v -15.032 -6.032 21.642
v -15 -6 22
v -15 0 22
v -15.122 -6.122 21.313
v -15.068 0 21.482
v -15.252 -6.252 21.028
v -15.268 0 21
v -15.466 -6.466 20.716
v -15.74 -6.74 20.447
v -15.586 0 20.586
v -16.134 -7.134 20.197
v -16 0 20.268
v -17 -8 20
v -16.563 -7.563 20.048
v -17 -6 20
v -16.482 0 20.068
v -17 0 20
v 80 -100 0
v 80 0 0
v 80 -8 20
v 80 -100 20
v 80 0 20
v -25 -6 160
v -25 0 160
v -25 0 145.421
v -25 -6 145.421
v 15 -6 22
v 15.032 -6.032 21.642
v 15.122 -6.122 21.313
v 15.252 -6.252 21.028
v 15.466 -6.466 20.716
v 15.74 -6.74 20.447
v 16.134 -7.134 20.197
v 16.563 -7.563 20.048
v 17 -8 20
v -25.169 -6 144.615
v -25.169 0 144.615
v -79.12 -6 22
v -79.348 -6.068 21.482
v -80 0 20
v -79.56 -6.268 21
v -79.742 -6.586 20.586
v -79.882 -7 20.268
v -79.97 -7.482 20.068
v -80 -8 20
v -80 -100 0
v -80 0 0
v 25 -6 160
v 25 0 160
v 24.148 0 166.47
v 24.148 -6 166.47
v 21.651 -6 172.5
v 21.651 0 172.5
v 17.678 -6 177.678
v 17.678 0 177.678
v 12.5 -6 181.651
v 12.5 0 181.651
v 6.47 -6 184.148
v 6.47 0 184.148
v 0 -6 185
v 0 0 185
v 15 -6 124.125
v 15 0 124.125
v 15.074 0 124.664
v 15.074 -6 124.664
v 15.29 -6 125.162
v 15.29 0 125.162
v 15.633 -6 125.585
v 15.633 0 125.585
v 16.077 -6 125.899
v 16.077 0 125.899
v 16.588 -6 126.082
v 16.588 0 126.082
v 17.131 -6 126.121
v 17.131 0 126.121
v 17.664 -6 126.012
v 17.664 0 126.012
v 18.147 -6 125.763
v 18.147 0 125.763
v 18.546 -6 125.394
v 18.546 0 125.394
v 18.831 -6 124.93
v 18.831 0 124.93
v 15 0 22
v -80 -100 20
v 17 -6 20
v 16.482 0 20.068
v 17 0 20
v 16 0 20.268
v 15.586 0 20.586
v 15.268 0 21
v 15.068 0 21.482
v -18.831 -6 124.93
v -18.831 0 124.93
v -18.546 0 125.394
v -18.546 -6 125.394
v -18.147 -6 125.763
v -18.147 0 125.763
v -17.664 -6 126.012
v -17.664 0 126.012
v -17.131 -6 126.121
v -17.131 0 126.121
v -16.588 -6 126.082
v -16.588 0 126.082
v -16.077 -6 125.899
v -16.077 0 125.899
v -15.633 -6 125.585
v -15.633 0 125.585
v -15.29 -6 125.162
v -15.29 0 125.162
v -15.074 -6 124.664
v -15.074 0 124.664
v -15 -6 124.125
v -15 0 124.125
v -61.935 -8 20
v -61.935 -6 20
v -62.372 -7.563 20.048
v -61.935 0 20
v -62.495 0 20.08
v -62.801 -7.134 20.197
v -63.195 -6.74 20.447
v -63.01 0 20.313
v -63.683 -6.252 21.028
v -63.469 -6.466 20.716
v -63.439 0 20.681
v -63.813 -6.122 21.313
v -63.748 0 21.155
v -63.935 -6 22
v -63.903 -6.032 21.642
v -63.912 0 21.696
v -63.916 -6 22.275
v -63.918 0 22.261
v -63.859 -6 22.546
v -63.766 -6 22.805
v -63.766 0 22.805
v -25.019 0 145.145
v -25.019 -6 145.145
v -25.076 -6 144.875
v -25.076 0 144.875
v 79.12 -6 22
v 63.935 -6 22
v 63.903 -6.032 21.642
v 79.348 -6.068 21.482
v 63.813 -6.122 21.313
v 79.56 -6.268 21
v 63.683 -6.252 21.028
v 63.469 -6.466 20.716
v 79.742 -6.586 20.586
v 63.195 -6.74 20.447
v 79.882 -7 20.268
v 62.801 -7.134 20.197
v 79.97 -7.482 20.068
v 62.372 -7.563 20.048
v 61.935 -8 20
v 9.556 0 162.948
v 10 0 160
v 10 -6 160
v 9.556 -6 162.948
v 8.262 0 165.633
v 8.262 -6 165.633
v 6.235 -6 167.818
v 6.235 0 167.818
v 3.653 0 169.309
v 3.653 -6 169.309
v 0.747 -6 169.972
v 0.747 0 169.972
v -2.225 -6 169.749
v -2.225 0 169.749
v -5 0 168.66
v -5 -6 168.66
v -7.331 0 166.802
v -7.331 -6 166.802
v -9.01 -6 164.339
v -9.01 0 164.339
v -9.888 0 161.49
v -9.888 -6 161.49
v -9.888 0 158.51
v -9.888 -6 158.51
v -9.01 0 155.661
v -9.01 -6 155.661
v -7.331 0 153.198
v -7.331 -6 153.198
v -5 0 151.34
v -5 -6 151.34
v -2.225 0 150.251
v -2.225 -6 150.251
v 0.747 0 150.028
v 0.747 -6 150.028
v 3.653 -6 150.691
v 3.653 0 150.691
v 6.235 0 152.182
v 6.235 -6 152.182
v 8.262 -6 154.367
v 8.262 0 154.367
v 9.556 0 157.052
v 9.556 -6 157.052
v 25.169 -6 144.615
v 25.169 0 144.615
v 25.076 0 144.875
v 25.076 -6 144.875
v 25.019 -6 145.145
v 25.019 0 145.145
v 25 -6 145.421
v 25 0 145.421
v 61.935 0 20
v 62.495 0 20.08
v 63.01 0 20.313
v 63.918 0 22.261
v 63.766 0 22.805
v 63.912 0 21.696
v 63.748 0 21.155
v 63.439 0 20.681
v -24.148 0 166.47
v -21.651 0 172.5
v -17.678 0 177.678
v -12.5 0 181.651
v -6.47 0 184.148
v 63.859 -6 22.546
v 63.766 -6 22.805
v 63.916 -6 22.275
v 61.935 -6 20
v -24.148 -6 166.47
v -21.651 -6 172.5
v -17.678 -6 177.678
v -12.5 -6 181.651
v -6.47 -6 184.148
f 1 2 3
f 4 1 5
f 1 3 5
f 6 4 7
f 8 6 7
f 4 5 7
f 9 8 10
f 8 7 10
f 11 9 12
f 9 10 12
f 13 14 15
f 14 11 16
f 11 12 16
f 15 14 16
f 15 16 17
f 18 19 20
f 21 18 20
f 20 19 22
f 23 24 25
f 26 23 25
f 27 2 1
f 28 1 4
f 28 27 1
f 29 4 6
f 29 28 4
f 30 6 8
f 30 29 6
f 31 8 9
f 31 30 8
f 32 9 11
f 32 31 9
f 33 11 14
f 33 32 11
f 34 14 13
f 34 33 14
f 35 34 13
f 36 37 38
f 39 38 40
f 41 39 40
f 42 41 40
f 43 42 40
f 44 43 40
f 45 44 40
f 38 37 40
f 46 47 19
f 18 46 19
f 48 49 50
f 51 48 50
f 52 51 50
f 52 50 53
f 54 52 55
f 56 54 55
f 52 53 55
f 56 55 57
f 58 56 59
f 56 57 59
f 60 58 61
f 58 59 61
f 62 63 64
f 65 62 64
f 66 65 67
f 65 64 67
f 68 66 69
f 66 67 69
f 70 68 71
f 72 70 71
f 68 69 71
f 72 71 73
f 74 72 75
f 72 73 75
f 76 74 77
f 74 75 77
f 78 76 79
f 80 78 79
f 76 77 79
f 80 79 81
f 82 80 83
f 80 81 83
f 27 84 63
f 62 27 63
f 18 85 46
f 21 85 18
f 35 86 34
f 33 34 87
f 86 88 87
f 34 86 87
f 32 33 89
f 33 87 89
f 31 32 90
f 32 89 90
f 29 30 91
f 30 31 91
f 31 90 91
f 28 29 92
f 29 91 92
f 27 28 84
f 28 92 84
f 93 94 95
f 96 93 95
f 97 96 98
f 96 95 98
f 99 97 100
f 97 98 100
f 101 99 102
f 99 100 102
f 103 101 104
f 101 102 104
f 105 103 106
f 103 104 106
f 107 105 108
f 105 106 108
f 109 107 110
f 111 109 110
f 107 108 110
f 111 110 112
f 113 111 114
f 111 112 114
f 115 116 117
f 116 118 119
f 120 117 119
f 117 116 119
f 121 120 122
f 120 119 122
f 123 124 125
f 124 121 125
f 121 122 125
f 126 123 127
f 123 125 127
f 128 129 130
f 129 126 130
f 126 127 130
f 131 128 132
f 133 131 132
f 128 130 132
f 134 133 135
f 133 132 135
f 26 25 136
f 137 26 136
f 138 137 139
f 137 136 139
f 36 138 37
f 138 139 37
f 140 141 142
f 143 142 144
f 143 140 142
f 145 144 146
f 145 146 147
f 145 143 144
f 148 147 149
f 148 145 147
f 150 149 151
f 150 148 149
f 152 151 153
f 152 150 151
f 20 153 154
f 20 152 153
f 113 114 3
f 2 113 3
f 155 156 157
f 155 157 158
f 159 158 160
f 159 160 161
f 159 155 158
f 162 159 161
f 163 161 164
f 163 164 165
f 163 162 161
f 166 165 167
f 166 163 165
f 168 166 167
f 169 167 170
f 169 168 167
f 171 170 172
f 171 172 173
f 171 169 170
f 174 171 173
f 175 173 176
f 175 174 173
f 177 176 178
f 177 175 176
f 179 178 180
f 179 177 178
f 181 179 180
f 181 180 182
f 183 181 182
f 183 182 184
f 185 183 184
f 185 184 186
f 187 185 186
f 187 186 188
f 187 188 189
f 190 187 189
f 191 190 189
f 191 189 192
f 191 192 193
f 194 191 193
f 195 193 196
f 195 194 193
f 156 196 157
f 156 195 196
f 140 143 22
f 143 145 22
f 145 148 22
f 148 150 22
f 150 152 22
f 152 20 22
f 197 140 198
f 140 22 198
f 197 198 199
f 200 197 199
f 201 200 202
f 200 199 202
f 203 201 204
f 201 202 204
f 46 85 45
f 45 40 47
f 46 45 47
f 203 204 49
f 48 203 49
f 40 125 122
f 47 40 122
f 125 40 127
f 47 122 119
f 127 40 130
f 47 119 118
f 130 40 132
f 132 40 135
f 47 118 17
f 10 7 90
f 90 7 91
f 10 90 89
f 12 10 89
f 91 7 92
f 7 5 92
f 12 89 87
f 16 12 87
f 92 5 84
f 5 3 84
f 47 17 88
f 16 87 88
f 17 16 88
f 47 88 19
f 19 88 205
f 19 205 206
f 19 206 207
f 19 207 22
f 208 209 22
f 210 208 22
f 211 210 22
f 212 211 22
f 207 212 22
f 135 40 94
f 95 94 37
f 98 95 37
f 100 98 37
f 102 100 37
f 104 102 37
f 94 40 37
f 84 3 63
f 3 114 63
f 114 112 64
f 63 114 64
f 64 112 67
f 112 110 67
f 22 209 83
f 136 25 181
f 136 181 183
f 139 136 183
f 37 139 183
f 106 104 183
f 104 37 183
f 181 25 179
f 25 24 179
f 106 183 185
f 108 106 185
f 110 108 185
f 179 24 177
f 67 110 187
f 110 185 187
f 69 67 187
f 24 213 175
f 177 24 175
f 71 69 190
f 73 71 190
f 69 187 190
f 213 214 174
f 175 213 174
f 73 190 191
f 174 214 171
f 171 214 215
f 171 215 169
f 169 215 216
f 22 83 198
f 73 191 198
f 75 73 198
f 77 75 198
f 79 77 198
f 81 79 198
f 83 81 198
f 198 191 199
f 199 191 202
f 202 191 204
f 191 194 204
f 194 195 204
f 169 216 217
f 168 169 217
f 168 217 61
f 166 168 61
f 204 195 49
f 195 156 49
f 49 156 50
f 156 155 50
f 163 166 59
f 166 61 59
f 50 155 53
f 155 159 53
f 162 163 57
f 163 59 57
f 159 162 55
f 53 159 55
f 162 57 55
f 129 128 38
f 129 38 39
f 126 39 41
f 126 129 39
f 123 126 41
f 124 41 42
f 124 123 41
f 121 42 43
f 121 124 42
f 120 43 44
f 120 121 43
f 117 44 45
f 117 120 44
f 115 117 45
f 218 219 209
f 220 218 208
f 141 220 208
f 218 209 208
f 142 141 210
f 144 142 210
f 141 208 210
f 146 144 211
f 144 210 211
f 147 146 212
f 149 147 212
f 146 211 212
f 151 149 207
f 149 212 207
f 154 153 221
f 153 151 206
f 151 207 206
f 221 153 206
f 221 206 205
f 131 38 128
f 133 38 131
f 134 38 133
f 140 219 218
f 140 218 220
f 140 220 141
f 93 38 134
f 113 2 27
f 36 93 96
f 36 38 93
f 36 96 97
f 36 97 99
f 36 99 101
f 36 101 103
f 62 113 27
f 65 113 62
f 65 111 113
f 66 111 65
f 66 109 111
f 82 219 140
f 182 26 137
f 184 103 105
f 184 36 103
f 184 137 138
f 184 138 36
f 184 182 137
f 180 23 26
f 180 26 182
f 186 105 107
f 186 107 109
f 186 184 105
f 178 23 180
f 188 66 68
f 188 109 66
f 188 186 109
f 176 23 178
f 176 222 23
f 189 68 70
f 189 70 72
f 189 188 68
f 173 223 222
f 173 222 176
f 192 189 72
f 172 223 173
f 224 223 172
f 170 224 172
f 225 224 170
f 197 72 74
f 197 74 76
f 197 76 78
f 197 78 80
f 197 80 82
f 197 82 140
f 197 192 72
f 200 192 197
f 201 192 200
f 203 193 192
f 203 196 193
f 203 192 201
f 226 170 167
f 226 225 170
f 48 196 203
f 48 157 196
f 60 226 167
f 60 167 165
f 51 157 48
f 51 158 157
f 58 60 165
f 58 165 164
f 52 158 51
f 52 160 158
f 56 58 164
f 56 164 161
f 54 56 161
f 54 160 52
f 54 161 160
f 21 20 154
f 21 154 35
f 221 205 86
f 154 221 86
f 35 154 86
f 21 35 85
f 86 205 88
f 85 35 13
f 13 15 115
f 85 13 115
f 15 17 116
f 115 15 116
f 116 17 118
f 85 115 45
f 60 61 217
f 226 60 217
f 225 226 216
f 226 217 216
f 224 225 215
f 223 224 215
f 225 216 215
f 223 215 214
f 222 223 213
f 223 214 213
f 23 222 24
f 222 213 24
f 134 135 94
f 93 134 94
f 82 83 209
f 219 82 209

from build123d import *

# Parameters (mm, degrees)
F0_R     = 10
F1_DEPTH = 6
F2_DEPTH = 100
F3_R     = 2


with BuildPart() as f1:
    # F0 (on Front) → F1 (new body)
    with BuildSketch(Plane.XZ):
        Polygon((-80, 20), (-80, 0), (0, 0), (80, 0), (80, 20), (61.93496, 20), (17, 20), (-17, 20), (-61.93496, 20), align=None)
        with BuildLine():
            Line((-25.16937, 144.615068), (-80, 20))
            Line((-80, 20), (-61.93496, 20))
            ThreePointArc((-61.93496, 20), (-63.609916, 20.907058), (-63.76559, 22.805477))
            Line((-63.76559, 22.805477), (-18.83063, 124.930386))
            ThreePointArc((-18.83063, 124.930386), (-16.588454, 126.082109), (-15, 124.124909))
            Line((-15, 124.124909), (-15, 22))
            ThreePointArc((-15, 22), (-15.585786, 20.585786), (-17, 20))
            Line((-17, 20), (17, 20))
            ThreePointArc((17, 20), (15.585786, 20.585786), (15, 22))
            Line((15, 22), (15, 124.124909))
            ThreePointArc((15, 124.124909), (16.588454, 126.082109), (18.83063, 124.930386))
            Line((18.83063, 124.930386), (63.76559, 22.805477))
            ThreePointArc((63.76559, 22.805477), (63.609916, 20.907058), (61.93496, 20))
            Line((61.93496, 20), (80, 20))
            Line((80, 20), (25.16937, 144.615068))
            ThreePointArc((25.16937, 144.615068), (25.0428, 145.009), (25, 145.420546))
            Line((25, 145.420546), (25, 160))
            ThreePointArc((25, 160), (17.67767, 177.67767), (0, 185))
            ThreePointArc((0, 185), (-17.67767, 177.67767), (-25, 160))
            Line((-25, 160), (-25, 145.420546))
            ThreePointArc((-25, 145.420546), (-25.0428, 145.009), (-25.16937, 144.615068))
        make_face()
        with Locations((0, 160)):
            Circle(F0_R, mode=Mode.SUBTRACT)
    extrude(amount=F1_DEPTH)

    # F0 (on Front) → F2 (join)
    with BuildSketch(Plane.XZ):
        Polygon((-80, 20), (-80, 0), (0, 0), (80, 0), (80, 20), (61.93496, 20), (17, 20), (-17, 20), (-61.93496, 20), align=None)
    extrude(amount=F2_DEPTH)

    # F3
    f3_edges = [f1.edges().sort_by_distance(p)[0] for p in [
        (70.96748, -6, 20),
        (0, -6, 20),
        (-70.96748, -6, 20),
    ]]
    fillet(f3_edges, radius=F3_R)


solid = f1.part
